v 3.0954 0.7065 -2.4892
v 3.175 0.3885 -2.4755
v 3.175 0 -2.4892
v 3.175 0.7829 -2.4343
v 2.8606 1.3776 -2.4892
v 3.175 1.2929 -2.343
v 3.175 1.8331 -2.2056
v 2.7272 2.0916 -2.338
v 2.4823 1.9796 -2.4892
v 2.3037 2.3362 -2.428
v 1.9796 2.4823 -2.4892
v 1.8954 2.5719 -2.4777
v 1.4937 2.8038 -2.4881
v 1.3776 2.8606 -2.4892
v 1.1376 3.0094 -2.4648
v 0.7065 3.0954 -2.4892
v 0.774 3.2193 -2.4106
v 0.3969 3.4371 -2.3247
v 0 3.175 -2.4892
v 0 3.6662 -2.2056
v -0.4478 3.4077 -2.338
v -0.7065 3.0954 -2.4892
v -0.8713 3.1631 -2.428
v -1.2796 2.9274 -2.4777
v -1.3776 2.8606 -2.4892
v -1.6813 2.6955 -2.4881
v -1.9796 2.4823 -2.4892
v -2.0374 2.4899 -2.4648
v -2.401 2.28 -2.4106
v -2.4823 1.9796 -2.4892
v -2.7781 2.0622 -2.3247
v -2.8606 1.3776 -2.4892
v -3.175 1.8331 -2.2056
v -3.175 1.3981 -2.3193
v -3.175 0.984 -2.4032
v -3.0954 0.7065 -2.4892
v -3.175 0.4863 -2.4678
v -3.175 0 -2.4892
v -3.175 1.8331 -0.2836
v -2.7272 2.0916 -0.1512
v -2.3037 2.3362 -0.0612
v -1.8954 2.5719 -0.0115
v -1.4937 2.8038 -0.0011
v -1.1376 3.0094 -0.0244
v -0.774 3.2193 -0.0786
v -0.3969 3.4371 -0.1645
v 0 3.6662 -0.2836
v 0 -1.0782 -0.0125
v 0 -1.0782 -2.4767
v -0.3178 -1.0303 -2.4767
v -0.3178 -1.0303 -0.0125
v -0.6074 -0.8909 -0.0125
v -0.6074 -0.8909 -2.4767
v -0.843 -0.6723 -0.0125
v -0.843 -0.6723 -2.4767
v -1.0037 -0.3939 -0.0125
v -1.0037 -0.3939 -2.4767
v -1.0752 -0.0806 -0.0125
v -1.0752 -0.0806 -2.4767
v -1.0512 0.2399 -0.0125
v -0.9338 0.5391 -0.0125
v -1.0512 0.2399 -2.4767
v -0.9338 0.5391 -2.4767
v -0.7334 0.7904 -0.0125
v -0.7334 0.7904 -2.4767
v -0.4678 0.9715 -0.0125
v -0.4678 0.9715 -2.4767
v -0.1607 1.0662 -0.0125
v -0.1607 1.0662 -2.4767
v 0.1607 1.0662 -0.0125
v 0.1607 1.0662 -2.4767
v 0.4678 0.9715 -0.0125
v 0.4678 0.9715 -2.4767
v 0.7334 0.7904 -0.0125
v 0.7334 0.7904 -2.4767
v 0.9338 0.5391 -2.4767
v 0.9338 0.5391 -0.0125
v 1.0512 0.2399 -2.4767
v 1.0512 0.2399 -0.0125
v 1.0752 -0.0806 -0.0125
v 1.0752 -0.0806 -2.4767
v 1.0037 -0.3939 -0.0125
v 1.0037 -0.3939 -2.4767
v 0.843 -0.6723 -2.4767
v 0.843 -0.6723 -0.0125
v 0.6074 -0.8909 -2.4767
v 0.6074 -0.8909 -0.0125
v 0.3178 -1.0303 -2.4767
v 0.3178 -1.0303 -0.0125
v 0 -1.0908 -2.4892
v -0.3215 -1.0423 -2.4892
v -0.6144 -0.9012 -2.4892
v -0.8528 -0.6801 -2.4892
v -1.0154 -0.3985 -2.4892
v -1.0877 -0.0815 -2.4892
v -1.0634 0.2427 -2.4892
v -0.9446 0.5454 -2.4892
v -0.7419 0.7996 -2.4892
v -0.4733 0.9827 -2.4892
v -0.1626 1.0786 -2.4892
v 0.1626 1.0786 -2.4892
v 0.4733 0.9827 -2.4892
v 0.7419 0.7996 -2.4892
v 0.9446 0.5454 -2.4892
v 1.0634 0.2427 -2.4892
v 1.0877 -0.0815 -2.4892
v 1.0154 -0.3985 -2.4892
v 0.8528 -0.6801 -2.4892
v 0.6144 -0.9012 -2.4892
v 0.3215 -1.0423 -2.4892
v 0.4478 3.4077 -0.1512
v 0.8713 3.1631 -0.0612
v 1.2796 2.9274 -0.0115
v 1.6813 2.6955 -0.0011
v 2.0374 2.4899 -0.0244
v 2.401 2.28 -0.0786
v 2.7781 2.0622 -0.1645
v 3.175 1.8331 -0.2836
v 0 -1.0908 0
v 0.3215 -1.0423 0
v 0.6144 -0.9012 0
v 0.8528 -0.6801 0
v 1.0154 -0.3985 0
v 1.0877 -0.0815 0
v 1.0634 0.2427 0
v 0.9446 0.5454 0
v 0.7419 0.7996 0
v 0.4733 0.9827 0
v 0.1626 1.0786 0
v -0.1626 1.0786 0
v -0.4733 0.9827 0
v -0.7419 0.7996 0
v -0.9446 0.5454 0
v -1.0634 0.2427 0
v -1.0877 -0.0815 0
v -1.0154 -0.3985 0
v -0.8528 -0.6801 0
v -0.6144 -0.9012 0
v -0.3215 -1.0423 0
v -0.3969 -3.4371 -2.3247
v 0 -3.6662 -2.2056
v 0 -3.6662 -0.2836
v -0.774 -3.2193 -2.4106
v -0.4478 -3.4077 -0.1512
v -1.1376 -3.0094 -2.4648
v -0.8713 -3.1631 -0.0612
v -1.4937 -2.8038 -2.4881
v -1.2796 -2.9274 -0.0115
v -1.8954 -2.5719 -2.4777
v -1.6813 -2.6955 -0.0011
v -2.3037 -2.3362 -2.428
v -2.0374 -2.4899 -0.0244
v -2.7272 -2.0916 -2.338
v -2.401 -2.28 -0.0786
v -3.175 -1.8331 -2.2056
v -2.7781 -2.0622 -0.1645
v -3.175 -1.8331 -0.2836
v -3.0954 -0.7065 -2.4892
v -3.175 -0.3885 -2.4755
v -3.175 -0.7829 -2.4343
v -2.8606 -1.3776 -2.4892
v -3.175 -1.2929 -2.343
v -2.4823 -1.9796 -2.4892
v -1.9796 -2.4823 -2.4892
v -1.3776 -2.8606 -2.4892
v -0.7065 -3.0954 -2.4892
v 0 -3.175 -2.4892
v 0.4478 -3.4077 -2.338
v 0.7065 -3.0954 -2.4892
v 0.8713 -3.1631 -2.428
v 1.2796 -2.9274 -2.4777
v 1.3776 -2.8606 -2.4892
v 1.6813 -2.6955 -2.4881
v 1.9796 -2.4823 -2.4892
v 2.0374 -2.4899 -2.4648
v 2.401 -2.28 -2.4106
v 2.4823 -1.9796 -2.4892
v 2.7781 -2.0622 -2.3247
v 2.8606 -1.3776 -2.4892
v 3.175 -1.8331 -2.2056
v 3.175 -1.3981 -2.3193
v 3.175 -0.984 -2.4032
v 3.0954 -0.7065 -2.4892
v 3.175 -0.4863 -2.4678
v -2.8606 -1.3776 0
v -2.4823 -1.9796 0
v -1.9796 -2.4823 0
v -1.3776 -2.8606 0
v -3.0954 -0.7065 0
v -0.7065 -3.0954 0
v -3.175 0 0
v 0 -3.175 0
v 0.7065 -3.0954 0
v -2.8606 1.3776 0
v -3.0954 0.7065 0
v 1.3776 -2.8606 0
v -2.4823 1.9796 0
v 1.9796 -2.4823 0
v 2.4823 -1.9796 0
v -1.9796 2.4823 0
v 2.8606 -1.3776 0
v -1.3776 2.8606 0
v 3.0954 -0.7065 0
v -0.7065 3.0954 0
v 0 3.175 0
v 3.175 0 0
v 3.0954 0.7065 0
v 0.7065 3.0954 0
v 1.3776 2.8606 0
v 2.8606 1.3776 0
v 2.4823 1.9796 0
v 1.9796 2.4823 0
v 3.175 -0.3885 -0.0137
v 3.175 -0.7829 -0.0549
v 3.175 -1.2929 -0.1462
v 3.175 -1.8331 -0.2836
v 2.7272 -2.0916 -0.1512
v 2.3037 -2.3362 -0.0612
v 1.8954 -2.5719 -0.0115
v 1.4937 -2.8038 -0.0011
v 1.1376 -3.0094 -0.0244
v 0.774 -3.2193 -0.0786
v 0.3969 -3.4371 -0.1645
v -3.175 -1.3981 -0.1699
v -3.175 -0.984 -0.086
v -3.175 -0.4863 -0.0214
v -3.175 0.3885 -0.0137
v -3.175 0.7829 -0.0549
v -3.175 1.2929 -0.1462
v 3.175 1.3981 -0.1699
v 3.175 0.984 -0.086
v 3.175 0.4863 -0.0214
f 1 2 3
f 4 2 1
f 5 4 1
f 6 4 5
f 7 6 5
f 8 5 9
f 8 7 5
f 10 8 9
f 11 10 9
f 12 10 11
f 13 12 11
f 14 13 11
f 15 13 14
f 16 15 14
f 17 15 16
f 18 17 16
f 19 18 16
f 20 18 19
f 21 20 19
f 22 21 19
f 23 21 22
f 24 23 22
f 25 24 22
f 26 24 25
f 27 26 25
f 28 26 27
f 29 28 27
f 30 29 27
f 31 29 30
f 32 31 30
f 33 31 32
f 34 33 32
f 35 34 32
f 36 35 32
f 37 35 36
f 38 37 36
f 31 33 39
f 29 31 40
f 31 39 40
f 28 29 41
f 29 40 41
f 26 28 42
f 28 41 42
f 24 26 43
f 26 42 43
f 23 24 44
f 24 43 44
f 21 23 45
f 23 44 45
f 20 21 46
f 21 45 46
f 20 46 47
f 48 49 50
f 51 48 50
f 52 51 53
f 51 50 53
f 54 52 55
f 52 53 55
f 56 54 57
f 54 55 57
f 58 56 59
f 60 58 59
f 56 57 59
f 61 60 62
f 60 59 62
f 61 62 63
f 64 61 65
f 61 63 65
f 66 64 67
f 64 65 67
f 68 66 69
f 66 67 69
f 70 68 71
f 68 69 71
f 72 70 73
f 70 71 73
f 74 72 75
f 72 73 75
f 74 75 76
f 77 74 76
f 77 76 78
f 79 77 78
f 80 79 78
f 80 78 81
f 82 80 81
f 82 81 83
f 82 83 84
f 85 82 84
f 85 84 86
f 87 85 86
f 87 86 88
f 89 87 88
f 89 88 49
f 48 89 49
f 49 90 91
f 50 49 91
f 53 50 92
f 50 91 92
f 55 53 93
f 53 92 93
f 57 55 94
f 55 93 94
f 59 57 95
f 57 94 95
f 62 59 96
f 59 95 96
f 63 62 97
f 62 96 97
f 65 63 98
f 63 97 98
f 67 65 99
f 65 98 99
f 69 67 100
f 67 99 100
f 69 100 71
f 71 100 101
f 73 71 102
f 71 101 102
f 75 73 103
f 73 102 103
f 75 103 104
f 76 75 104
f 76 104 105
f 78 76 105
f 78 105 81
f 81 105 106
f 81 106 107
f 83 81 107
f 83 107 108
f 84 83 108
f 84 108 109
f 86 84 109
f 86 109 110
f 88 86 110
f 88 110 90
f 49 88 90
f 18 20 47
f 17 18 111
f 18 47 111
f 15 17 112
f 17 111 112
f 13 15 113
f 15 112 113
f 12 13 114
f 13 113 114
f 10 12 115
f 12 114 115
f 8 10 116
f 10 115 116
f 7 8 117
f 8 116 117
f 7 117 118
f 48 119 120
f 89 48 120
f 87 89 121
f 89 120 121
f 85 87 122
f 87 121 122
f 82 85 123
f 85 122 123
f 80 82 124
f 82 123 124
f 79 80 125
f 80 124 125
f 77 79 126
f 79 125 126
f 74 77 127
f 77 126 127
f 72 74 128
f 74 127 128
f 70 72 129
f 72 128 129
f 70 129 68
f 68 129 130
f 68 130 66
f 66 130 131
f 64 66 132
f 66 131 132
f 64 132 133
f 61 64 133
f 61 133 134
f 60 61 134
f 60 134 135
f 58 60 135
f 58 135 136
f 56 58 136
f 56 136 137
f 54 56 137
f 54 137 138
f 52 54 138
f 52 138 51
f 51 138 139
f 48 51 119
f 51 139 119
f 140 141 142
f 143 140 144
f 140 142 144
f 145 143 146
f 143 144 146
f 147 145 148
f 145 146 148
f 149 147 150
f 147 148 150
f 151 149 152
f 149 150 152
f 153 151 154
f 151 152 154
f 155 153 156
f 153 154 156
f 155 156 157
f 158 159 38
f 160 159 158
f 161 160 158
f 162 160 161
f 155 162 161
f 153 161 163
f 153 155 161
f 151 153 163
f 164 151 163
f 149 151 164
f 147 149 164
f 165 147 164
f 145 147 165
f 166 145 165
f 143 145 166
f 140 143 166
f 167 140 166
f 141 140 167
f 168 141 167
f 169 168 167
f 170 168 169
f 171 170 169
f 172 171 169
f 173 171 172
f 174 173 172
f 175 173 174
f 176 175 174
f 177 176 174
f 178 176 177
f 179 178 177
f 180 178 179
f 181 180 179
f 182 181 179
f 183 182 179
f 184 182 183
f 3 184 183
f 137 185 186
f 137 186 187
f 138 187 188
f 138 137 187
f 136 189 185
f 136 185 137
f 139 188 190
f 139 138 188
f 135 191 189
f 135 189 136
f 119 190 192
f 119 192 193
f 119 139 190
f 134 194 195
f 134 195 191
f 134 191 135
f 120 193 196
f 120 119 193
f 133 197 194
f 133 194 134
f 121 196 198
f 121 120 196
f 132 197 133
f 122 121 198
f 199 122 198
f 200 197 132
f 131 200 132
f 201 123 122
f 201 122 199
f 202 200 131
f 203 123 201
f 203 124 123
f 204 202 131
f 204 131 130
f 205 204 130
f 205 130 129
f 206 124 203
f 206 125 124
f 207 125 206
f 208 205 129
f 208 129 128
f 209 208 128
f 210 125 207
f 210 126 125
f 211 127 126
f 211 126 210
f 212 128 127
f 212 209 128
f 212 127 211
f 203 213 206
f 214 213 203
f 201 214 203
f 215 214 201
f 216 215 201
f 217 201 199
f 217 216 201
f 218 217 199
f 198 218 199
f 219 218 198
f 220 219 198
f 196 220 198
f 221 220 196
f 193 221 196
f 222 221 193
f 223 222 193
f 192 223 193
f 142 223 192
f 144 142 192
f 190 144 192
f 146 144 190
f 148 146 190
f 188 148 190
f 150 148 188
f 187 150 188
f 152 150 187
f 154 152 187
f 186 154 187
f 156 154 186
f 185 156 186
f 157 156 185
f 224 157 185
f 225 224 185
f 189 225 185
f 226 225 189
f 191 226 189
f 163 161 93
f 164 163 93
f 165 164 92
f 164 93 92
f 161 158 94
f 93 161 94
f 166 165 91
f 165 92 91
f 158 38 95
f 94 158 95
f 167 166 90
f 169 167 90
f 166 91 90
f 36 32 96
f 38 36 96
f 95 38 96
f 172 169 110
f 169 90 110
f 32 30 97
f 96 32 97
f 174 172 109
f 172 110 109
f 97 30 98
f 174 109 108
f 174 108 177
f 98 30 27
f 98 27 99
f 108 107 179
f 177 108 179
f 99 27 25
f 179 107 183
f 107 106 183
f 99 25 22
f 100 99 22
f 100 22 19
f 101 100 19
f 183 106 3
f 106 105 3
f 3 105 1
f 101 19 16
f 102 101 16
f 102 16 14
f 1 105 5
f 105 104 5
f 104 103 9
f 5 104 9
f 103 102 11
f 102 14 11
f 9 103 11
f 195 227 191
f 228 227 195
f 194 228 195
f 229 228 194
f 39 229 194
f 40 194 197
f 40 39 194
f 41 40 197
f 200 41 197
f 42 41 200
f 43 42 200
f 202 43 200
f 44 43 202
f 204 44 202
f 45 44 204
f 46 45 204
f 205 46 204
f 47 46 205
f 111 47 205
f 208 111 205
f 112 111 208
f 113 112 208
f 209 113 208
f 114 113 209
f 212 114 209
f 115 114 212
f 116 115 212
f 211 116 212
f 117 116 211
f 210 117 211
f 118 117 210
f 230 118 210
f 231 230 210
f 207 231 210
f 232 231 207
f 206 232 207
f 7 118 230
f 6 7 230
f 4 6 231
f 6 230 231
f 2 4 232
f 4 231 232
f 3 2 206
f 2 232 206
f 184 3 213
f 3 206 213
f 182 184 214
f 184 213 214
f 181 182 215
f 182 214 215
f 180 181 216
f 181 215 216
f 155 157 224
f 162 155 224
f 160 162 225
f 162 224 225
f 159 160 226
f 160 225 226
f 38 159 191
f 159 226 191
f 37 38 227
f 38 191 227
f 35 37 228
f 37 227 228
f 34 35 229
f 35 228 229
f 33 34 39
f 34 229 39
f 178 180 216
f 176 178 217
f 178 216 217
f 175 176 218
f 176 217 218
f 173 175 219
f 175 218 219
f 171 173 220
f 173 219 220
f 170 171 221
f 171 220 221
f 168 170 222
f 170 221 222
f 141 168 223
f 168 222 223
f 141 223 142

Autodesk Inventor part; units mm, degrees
ref_plane "YZ Plane" through (0, 0, 0) normal (1, 0, 0) x (0, 1, 0)
sketch "Sketch7" plane through (0, 0, 0) normal (0, 0, 1) x (1, 0, 0)
  circle A0 centre (0, 0) radius 3.175 construction
  line L0 (-3.175, -1.8331) -> (-3.175, 1.8331)
  line L1 (-3.175, 1.8331) -> (0, 3.6662)
  line L2 (0, 3.6662) -> (3.175, 1.8331)
  line L3 (3.175, 1.8331) -> (3.175, -1.8331)
  line L4 (3.175, -1.8331) -> (0, -3.6662)
  line L5 (0, -3.6662) -> (-3.175, -1.8331)
  dimension "d40" = 6.35
extrude "Extrusion1" add sketch "Sketch7" against normal blind 2.4892
sketch "Sketch11" plane through (0, 0, 0) normal (0, 0, 1) x (1, 0, 0)
  line L0 (0, 3.6662) -> (3.175, 1.8331) projected
  line L1 (-3.175, 1.8331) -> (0, 3.6662) projected
  line L2 (-3.175, 1.8331) -> (3.175, -1.8331) construction
  line L3 (-3.175, -1.8331) -> (3.175, 1.8331) construction
  point P0 (0, 0)
hole "Hole1" at (0, 0, 0) direction (0, 0, -1) diameter 2.1565 end through all thread size "4-40 UNC" class "2B" standard "ANSI Unified Screw Threads"
chamfer "Chamfer1" distance 0.0125 angle 45 2 edges at (0, 1.0782, 0) (0, 1.0782, -2.4892)
sketch "Sketch9" plane through (0, 0, 0) normal (1, 0, 0) x (0, 1, 0)
  line L0 (-3.6662, -2.2056) -> (-3.6662, -2.4892)
  line L1 (-3.6662, -2.4892) -> (-3.175, -2.4892)
  line L2 (-3.175, -2.4892) -> (-3.6662, -2.2056)
  line L3 (0, -2.5459) -> (0, -2.1489) projected
  line L4 (-3.6662, -2.4892) -> (-1.8331, -2.4892) projected
  dimension "d38" = 6.35
  dimension "d41" = 150
revolve "Revolution1" cut sketch "Sketch9" angle 360 about axis through (0, 0, -10) along (0, 0, 1)
sketch "Sketch10" plane through (0, 0, 0) normal (1, 0, 0) x (0, 1, 0)
  line L0 (-3.6662, -0.2836) -> (-3.6662, 0)
  line L1 (-3.6662, 0) -> (-3.175, 0)
  line L2 (-3.175, 0) -> (-3.6662, -0.2836)
  line L3 (0, -0.3403) -> (0, 0.0567) projected
  line L4 (-1.8331, 0) -> (-3.6662, 0) projected
  dimension "d45" = 6.35
  dimension "d46" = 150
revolve "Revolution2" cut sketch "Sketch10" angle 360 about axis through (0, 0, -10) along (0, 0, 1)
ref_plane "MSC_PF1" through (0, 0, 0) normal (1, 0, 0) x (0, 1, 0)
ref_plane "MSC_PT1" through (0, 0, 0) normal (0, 0, 1) x (1, 0, 0)
equation "\"d38\" = Fbas"
equation "\"d40\" = Fbas"
equation "\"d29\" = Hbas"
equation "\"d63\" = 0.5 * PTC"
equation "\"d45\" = Fbas"
equation "\"Fbas\" = 6.35"
equation "\"Hbas\" = 2.4892"
equation "\"NND\" = 2.8448"
equation "\"THREADDIA\" = NND"
equation "\"PTC\" = 0.025"
properties part number "ASME B18.6.3 - 4-40" material "Steel, Mild"
